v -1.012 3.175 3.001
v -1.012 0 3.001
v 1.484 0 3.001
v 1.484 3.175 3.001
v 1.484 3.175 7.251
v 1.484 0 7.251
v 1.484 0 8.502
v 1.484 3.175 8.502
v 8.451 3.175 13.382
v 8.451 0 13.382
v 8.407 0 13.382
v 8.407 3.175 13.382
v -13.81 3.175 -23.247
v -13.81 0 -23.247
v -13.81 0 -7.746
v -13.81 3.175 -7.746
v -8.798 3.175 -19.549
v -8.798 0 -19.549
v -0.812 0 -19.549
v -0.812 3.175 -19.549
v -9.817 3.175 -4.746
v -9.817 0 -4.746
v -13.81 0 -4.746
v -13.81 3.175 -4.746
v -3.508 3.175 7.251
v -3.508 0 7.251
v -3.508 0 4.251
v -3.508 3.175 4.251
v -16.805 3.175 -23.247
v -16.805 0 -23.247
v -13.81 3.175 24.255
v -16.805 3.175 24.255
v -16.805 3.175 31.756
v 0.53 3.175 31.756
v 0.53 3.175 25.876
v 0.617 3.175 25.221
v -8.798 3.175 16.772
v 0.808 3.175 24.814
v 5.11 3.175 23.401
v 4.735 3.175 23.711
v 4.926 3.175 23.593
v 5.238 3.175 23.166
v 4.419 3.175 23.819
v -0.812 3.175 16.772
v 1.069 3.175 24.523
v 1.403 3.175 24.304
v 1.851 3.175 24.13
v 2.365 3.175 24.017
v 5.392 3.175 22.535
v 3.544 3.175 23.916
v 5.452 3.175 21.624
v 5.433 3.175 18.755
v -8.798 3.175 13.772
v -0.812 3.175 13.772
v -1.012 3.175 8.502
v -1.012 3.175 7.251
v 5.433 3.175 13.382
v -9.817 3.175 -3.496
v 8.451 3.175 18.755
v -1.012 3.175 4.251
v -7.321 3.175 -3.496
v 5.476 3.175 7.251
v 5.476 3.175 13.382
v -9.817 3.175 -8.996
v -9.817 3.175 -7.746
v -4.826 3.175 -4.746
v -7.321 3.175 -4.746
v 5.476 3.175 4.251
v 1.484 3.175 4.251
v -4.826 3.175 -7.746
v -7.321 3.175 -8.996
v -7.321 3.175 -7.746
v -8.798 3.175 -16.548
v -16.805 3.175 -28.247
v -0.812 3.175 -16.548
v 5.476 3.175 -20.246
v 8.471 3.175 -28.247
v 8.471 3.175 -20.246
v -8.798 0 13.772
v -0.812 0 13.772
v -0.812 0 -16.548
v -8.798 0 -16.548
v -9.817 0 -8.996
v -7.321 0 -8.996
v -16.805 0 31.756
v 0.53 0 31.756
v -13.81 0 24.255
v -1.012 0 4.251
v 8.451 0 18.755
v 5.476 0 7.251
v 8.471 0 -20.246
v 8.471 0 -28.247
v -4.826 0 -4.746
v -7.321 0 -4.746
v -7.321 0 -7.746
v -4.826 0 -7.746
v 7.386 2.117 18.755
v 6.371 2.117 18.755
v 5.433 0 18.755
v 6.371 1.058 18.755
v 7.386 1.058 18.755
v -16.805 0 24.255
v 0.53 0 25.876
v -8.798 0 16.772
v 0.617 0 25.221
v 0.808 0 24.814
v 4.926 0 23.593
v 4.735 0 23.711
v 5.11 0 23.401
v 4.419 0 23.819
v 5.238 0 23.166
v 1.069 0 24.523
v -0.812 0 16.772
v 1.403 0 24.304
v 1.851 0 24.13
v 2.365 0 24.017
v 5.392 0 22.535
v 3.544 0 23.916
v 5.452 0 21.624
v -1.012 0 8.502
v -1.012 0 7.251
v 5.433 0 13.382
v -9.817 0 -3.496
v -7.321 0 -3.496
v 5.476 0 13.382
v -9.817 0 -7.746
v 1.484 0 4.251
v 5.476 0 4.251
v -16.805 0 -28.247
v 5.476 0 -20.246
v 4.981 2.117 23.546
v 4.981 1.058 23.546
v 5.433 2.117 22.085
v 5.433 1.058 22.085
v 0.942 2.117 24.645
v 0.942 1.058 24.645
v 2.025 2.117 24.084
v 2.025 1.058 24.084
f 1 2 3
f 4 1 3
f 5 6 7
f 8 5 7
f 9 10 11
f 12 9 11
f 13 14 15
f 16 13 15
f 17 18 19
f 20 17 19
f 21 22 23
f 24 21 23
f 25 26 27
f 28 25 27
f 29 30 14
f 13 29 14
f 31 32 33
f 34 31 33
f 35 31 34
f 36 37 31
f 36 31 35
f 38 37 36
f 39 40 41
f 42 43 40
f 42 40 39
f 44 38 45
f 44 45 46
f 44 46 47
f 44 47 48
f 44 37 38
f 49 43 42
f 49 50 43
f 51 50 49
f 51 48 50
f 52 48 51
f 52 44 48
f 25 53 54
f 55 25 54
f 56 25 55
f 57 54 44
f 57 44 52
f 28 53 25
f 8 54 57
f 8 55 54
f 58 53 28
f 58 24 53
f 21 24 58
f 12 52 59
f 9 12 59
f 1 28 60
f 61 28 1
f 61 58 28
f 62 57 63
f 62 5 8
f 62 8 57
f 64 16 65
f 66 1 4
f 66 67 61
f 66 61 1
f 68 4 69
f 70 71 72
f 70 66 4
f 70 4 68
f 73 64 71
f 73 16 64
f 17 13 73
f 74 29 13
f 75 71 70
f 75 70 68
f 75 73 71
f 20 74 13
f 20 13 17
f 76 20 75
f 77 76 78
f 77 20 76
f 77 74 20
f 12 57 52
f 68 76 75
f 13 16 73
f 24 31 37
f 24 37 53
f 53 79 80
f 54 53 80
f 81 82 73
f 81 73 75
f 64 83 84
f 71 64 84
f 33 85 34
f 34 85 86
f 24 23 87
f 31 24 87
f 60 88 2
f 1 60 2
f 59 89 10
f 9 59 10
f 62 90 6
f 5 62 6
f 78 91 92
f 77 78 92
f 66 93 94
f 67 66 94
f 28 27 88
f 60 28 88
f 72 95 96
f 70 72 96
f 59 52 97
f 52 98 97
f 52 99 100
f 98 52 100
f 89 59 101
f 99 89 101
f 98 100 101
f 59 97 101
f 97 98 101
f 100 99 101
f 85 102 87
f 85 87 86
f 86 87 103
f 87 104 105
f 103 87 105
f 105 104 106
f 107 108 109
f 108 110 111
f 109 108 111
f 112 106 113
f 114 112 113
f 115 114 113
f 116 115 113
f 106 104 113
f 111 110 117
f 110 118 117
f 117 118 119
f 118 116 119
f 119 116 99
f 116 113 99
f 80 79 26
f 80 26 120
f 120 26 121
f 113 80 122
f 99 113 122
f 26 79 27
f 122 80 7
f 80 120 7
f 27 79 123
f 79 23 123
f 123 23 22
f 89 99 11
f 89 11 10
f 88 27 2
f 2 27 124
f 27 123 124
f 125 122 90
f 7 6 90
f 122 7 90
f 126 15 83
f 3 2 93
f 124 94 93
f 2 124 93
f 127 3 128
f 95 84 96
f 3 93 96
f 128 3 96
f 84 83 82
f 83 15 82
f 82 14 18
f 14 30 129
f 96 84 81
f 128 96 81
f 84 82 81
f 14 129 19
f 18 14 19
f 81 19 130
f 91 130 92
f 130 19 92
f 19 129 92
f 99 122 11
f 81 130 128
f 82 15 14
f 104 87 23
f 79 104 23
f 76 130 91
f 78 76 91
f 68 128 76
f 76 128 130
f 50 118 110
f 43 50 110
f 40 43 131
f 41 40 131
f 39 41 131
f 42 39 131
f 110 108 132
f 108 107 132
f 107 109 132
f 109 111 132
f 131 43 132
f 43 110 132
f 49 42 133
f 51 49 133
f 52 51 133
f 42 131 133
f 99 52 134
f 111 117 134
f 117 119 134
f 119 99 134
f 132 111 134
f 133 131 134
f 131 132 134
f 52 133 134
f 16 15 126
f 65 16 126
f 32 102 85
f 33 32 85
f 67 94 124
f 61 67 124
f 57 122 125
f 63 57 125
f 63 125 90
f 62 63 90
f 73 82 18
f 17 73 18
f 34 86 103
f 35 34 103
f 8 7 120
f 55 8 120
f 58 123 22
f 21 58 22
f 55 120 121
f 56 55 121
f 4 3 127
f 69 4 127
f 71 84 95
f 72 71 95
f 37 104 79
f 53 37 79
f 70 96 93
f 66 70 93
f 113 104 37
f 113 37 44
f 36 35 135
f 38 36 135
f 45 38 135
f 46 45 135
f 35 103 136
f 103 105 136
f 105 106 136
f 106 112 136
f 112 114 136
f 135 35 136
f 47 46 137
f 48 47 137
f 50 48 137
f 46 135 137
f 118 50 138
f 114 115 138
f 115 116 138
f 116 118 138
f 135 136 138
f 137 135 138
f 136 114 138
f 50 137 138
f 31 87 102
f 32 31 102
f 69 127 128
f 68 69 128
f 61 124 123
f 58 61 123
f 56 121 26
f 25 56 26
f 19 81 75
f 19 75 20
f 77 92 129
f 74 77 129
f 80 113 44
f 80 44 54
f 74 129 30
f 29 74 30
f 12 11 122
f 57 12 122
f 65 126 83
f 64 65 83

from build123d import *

# Parameters (mm, degrees)
SKETCH1_W           = 7.985890062
SKETCH1_H           = 3.00014889
SKETCH1_W_2         = 7.985890063
SKETCH1_H_2         = 3.000080527
BOSS_EXTRUDE1_DEPTH = 3.175


with BuildPart() as part:
    # Sketch1 → Boss-Extrude1 (new body)
    with BuildSketch(Plane(origin=(0, 0, 0), x_dir=(1, 0, 0), z_dir=(0, 1, 0))):
        with BuildLine():
            Line((8.450778283, -13.38162857), (8.406948402, -13.382009456))
            Line((8.406948402, -13.382009456), (5.43267765, -13.382009456))
            Line((5.43267765, -13.382009456), (5.476497782, -13.38162857))
            Line((5.476497782, -13.38162857), (5.476497782, -7.251478059))
            Line((5.476497782, -7.251478059), (1.483591746, -7.251478059))
            Line((1.483591746, -7.251478059), (1.483591746, -8.50154498))
            Line((1.483591746, -8.50154498), (-1.012030582, -8.50154498))
            Line((-1.012030582, -8.50154498), (-1.012030582, -7.251478059))
            Line((-1.012030582, -7.251478059), (-3.507584669, -7.251478059))
            Line((-3.507584669, -7.251478059), (-3.507584669, -4.251397533))
            Line((-3.507584669, -4.251397533), (-1.012030582, -4.251397533))
            Line((-1.012030582, -4.251397533), (-1.012030582, -3.001320846))
            Line((-1.012030582, -3.001320846), (1.483591746, -3.001320846))
            Line((1.483591746, -3.001320846), (1.483591746, -4.251397533))
            Line((1.483591746, -4.251397533), (5.476497782, -4.251397533))
            Line((5.476497782, -4.251397533), (5.476497782, 20.246361134))
            Line((5.476497782, 20.246361134), (8.471221179, 20.246361134))
            Line((8.471221179, 20.246361134), (8.471221179, 28.246728876))
            Line((8.471221179, 28.246728876), (-16.804601477, 28.246728876))
            Line((-16.804601477, 28.246728876), (-16.804601477, 23.246510025))
            Line((-16.804601477, 23.246510025), (-13.809887829, 23.246510025))
            Line((-13.809887829, 23.246510025), (-13.809887829, 7.746043514))
            Line((-13.809887829, 7.746043514), (-9.816981793, 7.746043514))
            Line((-9.816981793, 7.746043514), (-9.816981793, 8.996110434))
            Line((-9.816981793, 8.996110434), (-7.321417957, 8.996110434))
            Line((-7.321417957, 8.996110434), (-7.321417957, 7.746043514))
            Line((-7.321417957, 7.746043514), (-4.825805378, 7.746043514))
            Line((-4.825805378, 7.746043514), (-4.825805378, 4.745894623))
            Line((-4.825805378, 4.745894623), (-7.321417957, 4.745894623))
            Line((-7.321417957, 4.745894623), (-7.321417957, 3.495827702))
            Line((-7.321417957, 3.495827702), (-9.816981793, 3.495827702))
            Line((-9.816981793, 3.495827702), (-9.816981793, 4.745894623))
            Line((-9.816981793, 4.745894623), (-13.809887829, 4.745894623))
            Line((-13.809887829, 4.745894623), (-13.809887829, -24.255271193))
            Line((-13.809887829, -24.255271193), (-16.804601477, -24.255271193))
            Line((-16.804601477, -24.255271193), (-16.804601477, -31.755565288))
            Line((-16.804601477, -31.755565288), (0.529541194, -31.755565288))
            Line((0.529541194, -31.755565288), (0.529541194, -25.875998513))
            add(Edge.make_bspline(
                [(0.529541194, -25.875998513), (0.529541194, -24.216108328), (1.884173069, -23.980760021), (3.543615638, -23.915862955)],
                knots=[38, 38, 38, 38, 39, 39, 39, 39], degree=3))
            add(Edge.make_bspline(
                [(3.543615638, -23.915862955), (5.651300627, -23.833288885), (5.482317719, -23.277547326), (5.43267765, -18.755056825)],
                knots=[39, 39, 39, 39, 40, 40, 40, 40], degree=3))
            add(Edge.make_bspline(
                [(5.43267765, -18.755056825), (6.324629372, -18.755056826), (7.369010812, -18.755056826), (8.450778283, -18.755056826)],
                knots=[40, 40, 40, 40, 41, 41, 41, 41], degree=3))
            Line((8.450778283, -18.755056826), (8.450778283, -13.38162857))
        make_face()
        with Locations((-4.805196753, 18.048513823)):
            Rectangle(SKETCH1_W, SKETCH1_H, mode=Mode.SUBTRACT)
        with Locations((-4.805196754, -15.272154822)):
            Rectangle(SKETCH1_W_2, SKETCH1_H_2, mode=Mode.SUBTRACT)
    extrude(amount=BOSS_EXTRUDE1_DEPTH)


solid = part.part
